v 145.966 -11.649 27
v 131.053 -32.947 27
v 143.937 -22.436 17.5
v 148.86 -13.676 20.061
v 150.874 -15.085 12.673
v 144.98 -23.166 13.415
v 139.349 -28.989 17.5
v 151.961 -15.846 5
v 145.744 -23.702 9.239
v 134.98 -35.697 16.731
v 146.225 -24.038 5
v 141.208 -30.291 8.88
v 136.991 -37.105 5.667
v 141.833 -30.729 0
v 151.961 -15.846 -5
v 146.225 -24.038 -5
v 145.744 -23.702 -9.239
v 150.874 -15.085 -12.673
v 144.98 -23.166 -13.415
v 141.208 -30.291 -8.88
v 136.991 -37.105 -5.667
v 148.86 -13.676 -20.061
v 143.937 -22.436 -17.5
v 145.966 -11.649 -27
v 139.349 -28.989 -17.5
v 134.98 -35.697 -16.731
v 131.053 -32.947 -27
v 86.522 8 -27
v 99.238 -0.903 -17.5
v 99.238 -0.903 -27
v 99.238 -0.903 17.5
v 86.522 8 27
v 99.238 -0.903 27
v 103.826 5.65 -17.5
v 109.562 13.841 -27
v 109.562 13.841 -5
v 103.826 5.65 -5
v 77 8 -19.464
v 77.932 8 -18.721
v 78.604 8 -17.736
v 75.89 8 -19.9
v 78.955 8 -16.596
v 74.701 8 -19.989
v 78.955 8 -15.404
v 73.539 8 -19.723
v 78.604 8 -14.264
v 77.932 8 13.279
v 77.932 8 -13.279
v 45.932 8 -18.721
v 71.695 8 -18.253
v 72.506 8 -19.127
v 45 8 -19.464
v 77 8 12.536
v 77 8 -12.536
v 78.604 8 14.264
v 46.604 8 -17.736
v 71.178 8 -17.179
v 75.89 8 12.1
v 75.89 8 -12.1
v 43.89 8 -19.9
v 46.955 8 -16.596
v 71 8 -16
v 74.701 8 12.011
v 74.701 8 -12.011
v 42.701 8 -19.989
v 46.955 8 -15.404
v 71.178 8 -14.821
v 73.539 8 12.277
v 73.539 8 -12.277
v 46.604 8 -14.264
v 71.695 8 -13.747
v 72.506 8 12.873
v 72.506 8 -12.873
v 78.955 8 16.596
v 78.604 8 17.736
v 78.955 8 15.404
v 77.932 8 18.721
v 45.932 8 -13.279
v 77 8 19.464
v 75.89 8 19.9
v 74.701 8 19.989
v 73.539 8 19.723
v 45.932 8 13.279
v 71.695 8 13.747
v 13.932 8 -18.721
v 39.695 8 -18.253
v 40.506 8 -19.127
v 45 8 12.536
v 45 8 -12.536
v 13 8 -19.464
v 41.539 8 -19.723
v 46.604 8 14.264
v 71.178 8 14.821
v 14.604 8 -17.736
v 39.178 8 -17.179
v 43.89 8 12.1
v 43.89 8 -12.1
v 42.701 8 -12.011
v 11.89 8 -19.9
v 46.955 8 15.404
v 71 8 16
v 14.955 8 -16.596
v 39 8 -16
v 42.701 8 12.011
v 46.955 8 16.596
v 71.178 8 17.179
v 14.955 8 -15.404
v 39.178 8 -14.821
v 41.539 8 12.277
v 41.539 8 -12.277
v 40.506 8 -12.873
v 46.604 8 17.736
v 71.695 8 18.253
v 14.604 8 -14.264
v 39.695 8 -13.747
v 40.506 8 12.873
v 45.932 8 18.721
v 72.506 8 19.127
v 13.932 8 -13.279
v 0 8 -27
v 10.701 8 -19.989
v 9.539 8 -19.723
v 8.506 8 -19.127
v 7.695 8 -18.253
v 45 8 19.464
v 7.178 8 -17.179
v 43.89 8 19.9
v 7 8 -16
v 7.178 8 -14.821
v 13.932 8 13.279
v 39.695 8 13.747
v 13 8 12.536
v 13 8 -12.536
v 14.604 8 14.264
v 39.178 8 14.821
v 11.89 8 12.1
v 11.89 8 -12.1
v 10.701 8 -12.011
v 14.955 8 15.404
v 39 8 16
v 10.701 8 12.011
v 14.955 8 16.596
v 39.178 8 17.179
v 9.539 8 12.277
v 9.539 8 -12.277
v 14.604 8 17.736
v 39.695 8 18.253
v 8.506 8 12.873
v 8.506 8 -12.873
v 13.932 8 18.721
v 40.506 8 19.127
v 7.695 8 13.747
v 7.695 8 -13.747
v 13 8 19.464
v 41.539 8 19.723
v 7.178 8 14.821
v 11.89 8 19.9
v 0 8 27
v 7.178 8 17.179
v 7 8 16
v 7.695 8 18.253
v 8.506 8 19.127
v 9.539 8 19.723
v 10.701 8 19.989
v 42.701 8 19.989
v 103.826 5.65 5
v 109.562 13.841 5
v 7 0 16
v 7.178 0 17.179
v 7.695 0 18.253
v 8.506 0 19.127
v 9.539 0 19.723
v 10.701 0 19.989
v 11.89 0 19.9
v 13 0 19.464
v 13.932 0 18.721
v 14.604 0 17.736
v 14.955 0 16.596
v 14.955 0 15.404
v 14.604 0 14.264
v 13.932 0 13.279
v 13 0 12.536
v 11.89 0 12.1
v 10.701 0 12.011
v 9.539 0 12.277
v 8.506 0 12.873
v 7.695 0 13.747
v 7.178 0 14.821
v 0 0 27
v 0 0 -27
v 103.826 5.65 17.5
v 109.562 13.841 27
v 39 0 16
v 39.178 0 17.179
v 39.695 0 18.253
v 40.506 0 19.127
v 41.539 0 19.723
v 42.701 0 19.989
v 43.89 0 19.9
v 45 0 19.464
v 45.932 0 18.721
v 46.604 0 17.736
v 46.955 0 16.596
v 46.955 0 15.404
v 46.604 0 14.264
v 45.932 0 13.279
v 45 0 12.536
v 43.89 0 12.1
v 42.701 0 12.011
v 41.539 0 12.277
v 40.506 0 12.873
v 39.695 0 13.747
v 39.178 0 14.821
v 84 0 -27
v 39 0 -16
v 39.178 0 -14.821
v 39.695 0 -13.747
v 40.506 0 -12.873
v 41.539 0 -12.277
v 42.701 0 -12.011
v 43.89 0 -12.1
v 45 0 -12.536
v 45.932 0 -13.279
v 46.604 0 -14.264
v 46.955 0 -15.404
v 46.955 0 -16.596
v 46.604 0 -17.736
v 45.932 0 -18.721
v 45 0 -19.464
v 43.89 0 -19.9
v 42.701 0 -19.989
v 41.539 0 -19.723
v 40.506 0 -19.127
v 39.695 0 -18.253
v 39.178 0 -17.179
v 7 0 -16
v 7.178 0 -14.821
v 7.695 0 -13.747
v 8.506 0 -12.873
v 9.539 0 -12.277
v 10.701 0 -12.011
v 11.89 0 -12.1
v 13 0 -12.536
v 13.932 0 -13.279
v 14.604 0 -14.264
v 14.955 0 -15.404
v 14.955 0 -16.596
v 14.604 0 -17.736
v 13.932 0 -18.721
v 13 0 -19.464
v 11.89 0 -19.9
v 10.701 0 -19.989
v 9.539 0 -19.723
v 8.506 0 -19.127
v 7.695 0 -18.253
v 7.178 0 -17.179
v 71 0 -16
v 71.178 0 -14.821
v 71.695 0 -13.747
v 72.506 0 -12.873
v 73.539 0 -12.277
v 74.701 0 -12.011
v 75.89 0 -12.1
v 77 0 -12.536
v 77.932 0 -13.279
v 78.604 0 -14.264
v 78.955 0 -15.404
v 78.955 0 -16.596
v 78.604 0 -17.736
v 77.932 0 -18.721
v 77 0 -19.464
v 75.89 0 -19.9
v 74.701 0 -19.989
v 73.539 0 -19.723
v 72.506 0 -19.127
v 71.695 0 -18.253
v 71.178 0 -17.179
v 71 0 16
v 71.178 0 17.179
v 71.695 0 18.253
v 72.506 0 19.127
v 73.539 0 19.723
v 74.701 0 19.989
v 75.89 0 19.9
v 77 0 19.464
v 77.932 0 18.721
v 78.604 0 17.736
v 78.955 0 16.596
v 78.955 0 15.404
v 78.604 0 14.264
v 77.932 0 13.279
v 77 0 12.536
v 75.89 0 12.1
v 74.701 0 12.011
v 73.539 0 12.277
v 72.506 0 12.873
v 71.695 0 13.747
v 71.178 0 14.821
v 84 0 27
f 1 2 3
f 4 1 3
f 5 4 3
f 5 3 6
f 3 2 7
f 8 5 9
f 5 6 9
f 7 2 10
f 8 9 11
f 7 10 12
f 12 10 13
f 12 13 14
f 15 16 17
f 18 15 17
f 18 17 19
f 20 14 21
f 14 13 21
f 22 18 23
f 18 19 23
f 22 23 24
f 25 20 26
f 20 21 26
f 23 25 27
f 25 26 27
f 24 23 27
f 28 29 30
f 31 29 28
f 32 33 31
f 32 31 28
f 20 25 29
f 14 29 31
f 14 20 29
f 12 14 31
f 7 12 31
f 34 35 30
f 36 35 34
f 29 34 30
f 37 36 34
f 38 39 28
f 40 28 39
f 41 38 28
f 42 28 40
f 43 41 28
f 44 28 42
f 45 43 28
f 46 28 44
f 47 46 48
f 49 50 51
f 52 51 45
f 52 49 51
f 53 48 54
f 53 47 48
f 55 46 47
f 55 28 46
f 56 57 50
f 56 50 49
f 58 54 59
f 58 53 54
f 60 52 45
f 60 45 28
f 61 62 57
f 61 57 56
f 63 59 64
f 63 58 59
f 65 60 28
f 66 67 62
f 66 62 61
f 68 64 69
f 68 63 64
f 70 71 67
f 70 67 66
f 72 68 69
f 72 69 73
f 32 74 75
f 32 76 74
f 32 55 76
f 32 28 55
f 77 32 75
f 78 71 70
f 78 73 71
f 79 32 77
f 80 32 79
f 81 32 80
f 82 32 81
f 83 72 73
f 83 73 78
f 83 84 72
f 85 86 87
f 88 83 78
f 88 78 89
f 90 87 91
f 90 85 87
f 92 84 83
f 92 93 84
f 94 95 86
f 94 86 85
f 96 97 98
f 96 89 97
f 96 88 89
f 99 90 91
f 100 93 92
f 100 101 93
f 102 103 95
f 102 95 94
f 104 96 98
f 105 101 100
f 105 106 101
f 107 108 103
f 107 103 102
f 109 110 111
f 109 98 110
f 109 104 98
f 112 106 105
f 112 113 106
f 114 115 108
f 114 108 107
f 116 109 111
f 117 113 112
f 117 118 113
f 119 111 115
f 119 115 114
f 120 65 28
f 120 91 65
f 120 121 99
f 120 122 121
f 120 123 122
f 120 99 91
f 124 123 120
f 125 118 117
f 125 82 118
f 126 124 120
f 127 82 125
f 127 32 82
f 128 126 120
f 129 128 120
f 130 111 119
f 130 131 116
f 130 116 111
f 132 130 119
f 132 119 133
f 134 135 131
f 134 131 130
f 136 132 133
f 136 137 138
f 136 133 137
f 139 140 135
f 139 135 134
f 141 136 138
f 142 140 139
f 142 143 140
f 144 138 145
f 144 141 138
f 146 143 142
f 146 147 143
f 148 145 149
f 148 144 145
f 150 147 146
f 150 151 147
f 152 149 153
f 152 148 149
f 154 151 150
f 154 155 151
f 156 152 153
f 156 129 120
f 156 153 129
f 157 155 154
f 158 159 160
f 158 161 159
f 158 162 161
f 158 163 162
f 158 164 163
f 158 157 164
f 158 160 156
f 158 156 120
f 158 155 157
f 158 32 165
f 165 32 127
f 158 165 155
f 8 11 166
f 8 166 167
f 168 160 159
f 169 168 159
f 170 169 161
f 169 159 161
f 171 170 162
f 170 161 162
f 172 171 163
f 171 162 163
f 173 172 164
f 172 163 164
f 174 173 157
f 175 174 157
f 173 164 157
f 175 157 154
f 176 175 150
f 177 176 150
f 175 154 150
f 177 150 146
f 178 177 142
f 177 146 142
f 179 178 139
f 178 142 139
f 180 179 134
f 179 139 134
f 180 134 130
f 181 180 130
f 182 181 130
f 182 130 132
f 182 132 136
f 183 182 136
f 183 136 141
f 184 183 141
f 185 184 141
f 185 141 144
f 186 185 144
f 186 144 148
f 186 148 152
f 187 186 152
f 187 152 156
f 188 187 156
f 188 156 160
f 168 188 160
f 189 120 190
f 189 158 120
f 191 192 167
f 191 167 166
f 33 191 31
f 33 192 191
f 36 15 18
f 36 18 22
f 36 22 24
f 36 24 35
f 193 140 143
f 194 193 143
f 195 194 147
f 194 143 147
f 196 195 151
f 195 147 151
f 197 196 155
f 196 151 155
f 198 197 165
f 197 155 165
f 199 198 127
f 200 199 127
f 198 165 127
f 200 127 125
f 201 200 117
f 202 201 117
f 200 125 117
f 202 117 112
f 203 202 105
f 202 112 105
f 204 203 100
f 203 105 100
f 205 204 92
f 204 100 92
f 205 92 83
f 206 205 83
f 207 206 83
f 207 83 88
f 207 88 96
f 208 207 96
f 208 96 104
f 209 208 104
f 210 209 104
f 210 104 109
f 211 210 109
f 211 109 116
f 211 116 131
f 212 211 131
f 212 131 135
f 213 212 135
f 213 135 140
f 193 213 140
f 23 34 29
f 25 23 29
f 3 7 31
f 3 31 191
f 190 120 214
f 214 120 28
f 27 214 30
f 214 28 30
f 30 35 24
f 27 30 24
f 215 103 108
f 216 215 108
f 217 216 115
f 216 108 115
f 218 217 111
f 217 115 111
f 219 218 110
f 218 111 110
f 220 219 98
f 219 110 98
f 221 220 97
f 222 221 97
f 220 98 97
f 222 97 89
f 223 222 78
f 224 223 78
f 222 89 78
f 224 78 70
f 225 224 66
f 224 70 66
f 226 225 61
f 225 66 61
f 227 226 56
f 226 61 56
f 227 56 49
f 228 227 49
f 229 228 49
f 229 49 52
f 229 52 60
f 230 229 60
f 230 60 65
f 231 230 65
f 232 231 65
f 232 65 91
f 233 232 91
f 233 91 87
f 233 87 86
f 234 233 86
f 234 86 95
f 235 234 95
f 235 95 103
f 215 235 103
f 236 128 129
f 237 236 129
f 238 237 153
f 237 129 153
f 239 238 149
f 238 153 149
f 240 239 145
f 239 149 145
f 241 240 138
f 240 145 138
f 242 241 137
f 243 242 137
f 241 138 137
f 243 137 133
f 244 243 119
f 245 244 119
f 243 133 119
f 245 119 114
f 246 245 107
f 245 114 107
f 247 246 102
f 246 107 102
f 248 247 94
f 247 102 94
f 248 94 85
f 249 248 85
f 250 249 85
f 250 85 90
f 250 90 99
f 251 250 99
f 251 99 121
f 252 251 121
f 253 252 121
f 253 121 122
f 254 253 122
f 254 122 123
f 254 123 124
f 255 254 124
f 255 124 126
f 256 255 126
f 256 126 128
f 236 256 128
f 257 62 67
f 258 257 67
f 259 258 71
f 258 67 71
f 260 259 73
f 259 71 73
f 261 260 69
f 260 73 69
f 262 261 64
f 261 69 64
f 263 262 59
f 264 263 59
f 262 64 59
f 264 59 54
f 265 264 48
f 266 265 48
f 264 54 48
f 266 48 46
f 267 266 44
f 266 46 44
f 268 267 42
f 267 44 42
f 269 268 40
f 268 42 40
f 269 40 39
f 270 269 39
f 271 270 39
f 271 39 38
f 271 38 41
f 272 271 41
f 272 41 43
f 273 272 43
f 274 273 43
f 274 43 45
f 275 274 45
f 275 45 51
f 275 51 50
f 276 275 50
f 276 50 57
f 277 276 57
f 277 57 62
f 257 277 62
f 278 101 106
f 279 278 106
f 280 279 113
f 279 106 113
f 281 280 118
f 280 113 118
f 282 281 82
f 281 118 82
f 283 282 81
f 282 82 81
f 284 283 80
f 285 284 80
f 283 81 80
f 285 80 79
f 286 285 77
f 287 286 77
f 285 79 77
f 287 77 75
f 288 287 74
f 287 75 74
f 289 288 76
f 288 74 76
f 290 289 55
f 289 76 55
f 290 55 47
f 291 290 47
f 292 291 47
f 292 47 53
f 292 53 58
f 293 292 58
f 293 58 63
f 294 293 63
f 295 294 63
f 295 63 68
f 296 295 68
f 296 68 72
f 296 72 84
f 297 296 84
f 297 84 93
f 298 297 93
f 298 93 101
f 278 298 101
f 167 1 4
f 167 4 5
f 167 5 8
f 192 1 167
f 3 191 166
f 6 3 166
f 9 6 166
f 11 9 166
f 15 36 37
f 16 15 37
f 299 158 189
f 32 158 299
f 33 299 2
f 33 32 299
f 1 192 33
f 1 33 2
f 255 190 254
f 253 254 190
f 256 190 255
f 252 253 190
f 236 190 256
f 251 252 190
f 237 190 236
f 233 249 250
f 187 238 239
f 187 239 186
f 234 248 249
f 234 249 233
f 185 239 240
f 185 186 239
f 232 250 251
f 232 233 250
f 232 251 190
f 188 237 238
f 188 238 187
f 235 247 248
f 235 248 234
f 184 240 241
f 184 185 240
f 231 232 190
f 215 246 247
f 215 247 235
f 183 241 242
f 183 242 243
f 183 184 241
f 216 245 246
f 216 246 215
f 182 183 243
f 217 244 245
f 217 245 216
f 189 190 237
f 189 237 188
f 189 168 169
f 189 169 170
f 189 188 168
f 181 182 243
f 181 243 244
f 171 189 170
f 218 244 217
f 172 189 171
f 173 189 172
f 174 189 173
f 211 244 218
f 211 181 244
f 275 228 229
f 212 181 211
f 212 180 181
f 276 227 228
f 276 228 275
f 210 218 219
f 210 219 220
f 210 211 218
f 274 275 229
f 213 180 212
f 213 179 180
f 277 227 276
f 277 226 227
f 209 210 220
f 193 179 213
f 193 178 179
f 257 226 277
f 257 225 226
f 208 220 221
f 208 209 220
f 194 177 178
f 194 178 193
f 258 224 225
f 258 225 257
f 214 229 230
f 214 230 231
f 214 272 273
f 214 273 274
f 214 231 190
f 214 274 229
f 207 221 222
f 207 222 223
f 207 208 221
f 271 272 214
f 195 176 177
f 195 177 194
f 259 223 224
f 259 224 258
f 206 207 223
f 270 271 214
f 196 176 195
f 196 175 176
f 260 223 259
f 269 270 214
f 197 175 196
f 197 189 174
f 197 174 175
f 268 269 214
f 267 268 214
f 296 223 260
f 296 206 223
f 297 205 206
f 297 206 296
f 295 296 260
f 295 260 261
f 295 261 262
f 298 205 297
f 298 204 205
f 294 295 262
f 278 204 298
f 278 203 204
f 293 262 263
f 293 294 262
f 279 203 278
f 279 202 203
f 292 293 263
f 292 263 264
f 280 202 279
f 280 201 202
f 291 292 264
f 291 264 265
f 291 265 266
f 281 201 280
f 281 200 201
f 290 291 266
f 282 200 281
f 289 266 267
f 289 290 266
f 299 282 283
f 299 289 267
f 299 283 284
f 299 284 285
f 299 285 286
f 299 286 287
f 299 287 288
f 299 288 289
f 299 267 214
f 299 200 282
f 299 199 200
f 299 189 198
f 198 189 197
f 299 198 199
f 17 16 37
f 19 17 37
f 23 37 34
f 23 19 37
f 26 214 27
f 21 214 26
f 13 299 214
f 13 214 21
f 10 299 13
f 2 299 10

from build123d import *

# Parameters (mm, degrees)
BOSS_EXTRUDE1_DEPTH = 27
CUT_EXTRUDE1_REACH  = 163.033
SKETCH2_R           = 4
CUT_EXTRUDE2_REACH  = 146.741
CUT_EXTRUDE3_START  = -26
CUT_EXTRUDE3_DEPTH  = 26


with BuildPart() as part:
    # Sketch1 → Boss-Extrude1 (new, symmetric)
    with BuildSketch(Plane.XY):
        Polygon((0, 0), (84, 0), (137.244882879, -37.282468363), (152.157870224, -15.984515211), (109.561963921, 13.841459479), (99.237588067, -0.903277318), (86.522390311, 8), (0, 8), align=None)
    extrude(amount=BOSS_EXTRUDE1_DEPTH, both=True)

    # Sketch2 → Cut-Extrude1 (cut, up to next)
    with BuildSketch(Plane(origin=(0, 8, 0), x_dir=(1, 0, 0), z_dir=(0, 1, 0)), mode=Mode.PRIVATE) as cut_extrude1_sk1:
        with Locations(Location((11, 16, 0), (0, 0, 180))):
            Circle(SKETCH2_R)
    cut_extrude1_tool1 = extrude(cut_extrude1_sk1.sketch, amount=-CUT_EXTRUDE1_REACH, mode=Mode.PRIVATE) & part.part
    # Sketch2 → Cut-Extrude1 (cut, up to next)
    with BuildSketch(Plane(origin=(0, 8, 0), x_dir=(1, 0, 0), z_dir=(0, 1, 0)), mode=Mode.PRIVATE) as cut_extrude1_sk2:
        with Locations(Location((43, 16, 0), (0, 0, 180))):
            Circle(SKETCH2_R)
    cut_extrude1_tool2 = extrude(cut_extrude1_sk2.sketch, amount=-CUT_EXTRUDE1_REACH, mode=Mode.PRIVATE) & part.part
    # Sketch2 → Cut-Extrude1 (cut, up to next)
    with BuildSketch(Plane(origin=(0, 8, 0), x_dir=(1, 0, 0), z_dir=(0, 1, 0)), mode=Mode.PRIVATE) as cut_extrude1_sk3:
        with Locations(Location((75, 16, 0), (0, 0, 180))):
            Circle(SKETCH2_R)
    cut_extrude1_tool3 = extrude(cut_extrude1_sk3.sketch, amount=-CUT_EXTRUDE1_REACH, mode=Mode.PRIVATE) & part.part
    # Sketch2 → Cut-Extrude1 (cut, up to next)
    with BuildSketch(Plane(origin=(0, 8, 0), x_dir=(1, 0, 0), z_dir=(0, 1, 0)), mode=Mode.PRIVATE) as cut_extrude1_sk4:
        with Locations(Location((43, -16, 0), (0, 0, 180))):
            Circle(SKETCH2_R)
    cut_extrude1_tool4 = extrude(cut_extrude1_sk4.sketch, amount=-CUT_EXTRUDE1_REACH, mode=Mode.PRIVATE) & part.part
    # Sketch2 → Cut-Extrude1 (cut, up to next)
    with BuildSketch(Plane(origin=(0, 8, 0), x_dir=(1, 0, 0), z_dir=(0, 1, 0)), mode=Mode.PRIVATE) as cut_extrude1_sk5:
        with Locations(Location((75, -16, 0), (0, 0, 180))):
            Circle(SKETCH2_R)
    cut_extrude1_tool5 = extrude(cut_extrude1_sk5.sketch, amount=-CUT_EXTRUDE1_REACH, mode=Mode.PRIVATE) & part.part
    # Sketch2 → Cut-Extrude1 (cut, up to next)
    with BuildSketch(Plane(origin=(0, 8, 0), x_dir=(1, 0, 0), z_dir=(0, 1, 0)), mode=Mode.PRIVATE) as cut_extrude1_sk6:
        with Locations(Location((11, -16, 0), (0, 0, 180))):
            Circle(SKETCH2_R)
    cut_extrude1_tool6 = extrude(cut_extrude1_sk6.sketch, amount=-CUT_EXTRUDE1_REACH, mode=Mode.PRIVATE) & part.part
    add(cut_extrude1_tool1.solids().sort_by_distance((11, 8, -16))[0], mode=Mode.SUBTRACT)
    add(cut_extrude1_tool2.solids().sort_by_distance((43, 8, -16))[0], mode=Mode.SUBTRACT)
    add(cut_extrude1_tool3.solids().sort_by_distance((75, 8, -16))[0], mode=Mode.SUBTRACT)
    add(cut_extrude1_tool4.solids().sort_by_distance((43, 8, 16))[0], mode=Mode.SUBTRACT)
    add(cut_extrude1_tool5.solids().sort_by_distance((75, 8, 16))[0], mode=Mode.SUBTRACT)
    add(cut_extrude1_tool6.solids().sort_by_distance((11, 8, 16))[0], mode=Mode.SUBTRACT)

    # Sketch3 → Cut-Extrude2 (cut, up to next)
    with BuildSketch(Plane(origin=(109.609728898, -76.749558436, 0), x_dir=(0, 0, -1), z_dir=(0.819152044288994, -0.5735764363510429, 0)), mode=Mode.PRIVATE) as cut_extrude2_sk1:
        Polygon((-5, 74.180420653), (5, 74.180420653), (5, 64.180420653), (17.5, 64.180420653), (17.5, 56.180420653), (-17.5, 56.180420653), (-17.5, 64.180420653), (-5, 64.180420653), align=None)
    cut_extrude2_tool1 = extrude(cut_extrude2_sk1.sketch, amount=-CUT_EXTRUDE2_REACH, mode=Mode.PRIVATE) & part.part
    add(cut_extrude2_tool1.solids().sort_by_distance((145.486271, -25.512547, 0))[0], mode=Mode.SUBTRACT)

    # Sketch5 → Cut-Extrude3 (cut)
    with BuildSketch(Plane(origin=(42.548141325, 60.765043225, 0), x_dir=(0.8191520442889936, -0.5735764363510437, 0), z_dir=(0.5735764363510436, 0.8191520442889935, 0)).offset(CUT_EXTRUDE3_START)):
        with BuildLine():
            Line((126.249743807, 27), (150.866337787, 27))
            Line((150.866337787, 27), (150.866337787, -27))
            Line((150.866337787, -27), (126.249743807, -27))
            ThreePointArc((126.249743807, -27), (133.80877172, 0), (126.249743807, 27))
        make_face()
    extrude(amount=CUT_EXTRUDE3_DEPTH, mode=Mode.SUBTRACT)


solid = part.part
